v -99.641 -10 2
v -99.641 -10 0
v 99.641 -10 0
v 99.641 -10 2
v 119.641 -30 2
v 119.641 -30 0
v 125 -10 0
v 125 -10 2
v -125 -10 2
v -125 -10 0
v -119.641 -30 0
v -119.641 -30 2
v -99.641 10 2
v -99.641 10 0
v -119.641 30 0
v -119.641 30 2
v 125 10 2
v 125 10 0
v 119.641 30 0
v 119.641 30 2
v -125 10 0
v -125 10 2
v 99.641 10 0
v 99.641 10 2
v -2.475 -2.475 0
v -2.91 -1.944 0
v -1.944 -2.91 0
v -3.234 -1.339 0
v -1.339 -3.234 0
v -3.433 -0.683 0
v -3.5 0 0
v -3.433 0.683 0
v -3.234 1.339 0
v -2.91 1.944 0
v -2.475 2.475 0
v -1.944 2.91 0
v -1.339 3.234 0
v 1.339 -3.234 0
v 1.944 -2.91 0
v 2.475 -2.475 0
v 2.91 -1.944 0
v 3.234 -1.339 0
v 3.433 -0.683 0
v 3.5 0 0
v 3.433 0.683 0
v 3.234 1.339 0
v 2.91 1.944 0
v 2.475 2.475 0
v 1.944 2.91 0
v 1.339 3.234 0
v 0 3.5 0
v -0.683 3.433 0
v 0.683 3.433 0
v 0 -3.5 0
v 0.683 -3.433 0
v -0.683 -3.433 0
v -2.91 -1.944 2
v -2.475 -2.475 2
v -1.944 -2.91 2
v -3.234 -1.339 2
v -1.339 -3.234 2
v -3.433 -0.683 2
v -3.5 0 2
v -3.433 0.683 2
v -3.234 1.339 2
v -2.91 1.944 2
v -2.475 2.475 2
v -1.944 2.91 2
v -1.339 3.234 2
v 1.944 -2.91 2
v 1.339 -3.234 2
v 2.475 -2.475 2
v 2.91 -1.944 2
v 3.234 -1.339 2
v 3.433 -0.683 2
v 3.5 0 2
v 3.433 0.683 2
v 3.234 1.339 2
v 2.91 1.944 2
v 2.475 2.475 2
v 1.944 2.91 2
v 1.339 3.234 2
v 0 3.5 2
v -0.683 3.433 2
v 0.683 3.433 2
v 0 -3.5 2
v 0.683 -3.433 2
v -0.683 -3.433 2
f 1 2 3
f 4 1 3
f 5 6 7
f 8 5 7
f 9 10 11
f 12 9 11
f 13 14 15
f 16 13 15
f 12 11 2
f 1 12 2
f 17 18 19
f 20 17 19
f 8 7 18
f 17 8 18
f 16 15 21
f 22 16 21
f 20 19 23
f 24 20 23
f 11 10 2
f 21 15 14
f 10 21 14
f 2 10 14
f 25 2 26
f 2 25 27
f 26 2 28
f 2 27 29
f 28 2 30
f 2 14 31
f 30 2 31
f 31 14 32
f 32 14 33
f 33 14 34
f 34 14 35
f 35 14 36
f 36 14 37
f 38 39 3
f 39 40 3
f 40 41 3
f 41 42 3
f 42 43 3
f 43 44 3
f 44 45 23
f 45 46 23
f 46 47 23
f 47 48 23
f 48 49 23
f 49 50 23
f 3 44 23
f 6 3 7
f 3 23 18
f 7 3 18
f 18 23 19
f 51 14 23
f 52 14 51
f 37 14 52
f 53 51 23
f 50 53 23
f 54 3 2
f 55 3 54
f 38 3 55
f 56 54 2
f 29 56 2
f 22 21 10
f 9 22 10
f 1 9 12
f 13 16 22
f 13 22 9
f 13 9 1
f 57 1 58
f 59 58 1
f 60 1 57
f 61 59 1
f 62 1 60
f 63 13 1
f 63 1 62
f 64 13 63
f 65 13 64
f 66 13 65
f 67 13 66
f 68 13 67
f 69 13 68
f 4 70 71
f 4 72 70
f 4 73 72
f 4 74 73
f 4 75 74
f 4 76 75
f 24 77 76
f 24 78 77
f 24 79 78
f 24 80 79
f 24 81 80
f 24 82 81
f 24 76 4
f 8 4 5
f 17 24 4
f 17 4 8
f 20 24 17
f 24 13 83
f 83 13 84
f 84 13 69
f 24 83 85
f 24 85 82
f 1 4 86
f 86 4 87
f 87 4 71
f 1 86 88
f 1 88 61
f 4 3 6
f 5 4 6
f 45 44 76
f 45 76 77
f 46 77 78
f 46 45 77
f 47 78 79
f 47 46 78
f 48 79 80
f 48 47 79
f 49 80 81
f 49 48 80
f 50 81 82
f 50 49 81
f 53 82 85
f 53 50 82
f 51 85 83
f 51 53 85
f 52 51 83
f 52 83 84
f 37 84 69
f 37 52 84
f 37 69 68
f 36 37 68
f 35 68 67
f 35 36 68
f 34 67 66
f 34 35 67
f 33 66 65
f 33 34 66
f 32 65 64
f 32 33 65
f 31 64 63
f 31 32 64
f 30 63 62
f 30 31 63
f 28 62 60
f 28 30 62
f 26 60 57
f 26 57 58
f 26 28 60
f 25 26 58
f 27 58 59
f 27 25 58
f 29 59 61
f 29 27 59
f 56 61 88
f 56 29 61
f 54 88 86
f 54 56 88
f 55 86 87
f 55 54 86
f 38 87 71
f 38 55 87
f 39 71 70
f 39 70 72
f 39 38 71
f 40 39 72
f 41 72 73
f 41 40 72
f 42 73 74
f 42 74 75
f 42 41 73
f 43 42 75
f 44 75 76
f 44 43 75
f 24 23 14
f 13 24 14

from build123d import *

# Parameters (mm, degrees)
F0_R     = 3.5
F1_DEPTH = 2


with BuildPart() as f1:
    # F0 (on Top) → F1 (new body)
    with BuildSketch(Plane.XY):
        Polygon((125, -10), (125, 10), (99.641016, 10), (-99.641016, 10), (-125, 10), (-125, -10), (-99.641016, -10), (99.641016, -10), align=None)
        Circle(F0_R, mode=Mode.SUBTRACT)
        Polygon((99.641016, 10), (125, 10), (119.641016, 30), align=None)
        Polygon((119.641016, -30), (125, -10), (99.641016, -10), align=None)
        Polygon((-125, 10), (-99.641016, 10), (-119.641016, 30), align=None)
        Polygon((-119.641016, -30), (-99.641016, -10), (-125, -10), align=None)
    extrude(amount=F1_DEPTH)


solid = f1.part
